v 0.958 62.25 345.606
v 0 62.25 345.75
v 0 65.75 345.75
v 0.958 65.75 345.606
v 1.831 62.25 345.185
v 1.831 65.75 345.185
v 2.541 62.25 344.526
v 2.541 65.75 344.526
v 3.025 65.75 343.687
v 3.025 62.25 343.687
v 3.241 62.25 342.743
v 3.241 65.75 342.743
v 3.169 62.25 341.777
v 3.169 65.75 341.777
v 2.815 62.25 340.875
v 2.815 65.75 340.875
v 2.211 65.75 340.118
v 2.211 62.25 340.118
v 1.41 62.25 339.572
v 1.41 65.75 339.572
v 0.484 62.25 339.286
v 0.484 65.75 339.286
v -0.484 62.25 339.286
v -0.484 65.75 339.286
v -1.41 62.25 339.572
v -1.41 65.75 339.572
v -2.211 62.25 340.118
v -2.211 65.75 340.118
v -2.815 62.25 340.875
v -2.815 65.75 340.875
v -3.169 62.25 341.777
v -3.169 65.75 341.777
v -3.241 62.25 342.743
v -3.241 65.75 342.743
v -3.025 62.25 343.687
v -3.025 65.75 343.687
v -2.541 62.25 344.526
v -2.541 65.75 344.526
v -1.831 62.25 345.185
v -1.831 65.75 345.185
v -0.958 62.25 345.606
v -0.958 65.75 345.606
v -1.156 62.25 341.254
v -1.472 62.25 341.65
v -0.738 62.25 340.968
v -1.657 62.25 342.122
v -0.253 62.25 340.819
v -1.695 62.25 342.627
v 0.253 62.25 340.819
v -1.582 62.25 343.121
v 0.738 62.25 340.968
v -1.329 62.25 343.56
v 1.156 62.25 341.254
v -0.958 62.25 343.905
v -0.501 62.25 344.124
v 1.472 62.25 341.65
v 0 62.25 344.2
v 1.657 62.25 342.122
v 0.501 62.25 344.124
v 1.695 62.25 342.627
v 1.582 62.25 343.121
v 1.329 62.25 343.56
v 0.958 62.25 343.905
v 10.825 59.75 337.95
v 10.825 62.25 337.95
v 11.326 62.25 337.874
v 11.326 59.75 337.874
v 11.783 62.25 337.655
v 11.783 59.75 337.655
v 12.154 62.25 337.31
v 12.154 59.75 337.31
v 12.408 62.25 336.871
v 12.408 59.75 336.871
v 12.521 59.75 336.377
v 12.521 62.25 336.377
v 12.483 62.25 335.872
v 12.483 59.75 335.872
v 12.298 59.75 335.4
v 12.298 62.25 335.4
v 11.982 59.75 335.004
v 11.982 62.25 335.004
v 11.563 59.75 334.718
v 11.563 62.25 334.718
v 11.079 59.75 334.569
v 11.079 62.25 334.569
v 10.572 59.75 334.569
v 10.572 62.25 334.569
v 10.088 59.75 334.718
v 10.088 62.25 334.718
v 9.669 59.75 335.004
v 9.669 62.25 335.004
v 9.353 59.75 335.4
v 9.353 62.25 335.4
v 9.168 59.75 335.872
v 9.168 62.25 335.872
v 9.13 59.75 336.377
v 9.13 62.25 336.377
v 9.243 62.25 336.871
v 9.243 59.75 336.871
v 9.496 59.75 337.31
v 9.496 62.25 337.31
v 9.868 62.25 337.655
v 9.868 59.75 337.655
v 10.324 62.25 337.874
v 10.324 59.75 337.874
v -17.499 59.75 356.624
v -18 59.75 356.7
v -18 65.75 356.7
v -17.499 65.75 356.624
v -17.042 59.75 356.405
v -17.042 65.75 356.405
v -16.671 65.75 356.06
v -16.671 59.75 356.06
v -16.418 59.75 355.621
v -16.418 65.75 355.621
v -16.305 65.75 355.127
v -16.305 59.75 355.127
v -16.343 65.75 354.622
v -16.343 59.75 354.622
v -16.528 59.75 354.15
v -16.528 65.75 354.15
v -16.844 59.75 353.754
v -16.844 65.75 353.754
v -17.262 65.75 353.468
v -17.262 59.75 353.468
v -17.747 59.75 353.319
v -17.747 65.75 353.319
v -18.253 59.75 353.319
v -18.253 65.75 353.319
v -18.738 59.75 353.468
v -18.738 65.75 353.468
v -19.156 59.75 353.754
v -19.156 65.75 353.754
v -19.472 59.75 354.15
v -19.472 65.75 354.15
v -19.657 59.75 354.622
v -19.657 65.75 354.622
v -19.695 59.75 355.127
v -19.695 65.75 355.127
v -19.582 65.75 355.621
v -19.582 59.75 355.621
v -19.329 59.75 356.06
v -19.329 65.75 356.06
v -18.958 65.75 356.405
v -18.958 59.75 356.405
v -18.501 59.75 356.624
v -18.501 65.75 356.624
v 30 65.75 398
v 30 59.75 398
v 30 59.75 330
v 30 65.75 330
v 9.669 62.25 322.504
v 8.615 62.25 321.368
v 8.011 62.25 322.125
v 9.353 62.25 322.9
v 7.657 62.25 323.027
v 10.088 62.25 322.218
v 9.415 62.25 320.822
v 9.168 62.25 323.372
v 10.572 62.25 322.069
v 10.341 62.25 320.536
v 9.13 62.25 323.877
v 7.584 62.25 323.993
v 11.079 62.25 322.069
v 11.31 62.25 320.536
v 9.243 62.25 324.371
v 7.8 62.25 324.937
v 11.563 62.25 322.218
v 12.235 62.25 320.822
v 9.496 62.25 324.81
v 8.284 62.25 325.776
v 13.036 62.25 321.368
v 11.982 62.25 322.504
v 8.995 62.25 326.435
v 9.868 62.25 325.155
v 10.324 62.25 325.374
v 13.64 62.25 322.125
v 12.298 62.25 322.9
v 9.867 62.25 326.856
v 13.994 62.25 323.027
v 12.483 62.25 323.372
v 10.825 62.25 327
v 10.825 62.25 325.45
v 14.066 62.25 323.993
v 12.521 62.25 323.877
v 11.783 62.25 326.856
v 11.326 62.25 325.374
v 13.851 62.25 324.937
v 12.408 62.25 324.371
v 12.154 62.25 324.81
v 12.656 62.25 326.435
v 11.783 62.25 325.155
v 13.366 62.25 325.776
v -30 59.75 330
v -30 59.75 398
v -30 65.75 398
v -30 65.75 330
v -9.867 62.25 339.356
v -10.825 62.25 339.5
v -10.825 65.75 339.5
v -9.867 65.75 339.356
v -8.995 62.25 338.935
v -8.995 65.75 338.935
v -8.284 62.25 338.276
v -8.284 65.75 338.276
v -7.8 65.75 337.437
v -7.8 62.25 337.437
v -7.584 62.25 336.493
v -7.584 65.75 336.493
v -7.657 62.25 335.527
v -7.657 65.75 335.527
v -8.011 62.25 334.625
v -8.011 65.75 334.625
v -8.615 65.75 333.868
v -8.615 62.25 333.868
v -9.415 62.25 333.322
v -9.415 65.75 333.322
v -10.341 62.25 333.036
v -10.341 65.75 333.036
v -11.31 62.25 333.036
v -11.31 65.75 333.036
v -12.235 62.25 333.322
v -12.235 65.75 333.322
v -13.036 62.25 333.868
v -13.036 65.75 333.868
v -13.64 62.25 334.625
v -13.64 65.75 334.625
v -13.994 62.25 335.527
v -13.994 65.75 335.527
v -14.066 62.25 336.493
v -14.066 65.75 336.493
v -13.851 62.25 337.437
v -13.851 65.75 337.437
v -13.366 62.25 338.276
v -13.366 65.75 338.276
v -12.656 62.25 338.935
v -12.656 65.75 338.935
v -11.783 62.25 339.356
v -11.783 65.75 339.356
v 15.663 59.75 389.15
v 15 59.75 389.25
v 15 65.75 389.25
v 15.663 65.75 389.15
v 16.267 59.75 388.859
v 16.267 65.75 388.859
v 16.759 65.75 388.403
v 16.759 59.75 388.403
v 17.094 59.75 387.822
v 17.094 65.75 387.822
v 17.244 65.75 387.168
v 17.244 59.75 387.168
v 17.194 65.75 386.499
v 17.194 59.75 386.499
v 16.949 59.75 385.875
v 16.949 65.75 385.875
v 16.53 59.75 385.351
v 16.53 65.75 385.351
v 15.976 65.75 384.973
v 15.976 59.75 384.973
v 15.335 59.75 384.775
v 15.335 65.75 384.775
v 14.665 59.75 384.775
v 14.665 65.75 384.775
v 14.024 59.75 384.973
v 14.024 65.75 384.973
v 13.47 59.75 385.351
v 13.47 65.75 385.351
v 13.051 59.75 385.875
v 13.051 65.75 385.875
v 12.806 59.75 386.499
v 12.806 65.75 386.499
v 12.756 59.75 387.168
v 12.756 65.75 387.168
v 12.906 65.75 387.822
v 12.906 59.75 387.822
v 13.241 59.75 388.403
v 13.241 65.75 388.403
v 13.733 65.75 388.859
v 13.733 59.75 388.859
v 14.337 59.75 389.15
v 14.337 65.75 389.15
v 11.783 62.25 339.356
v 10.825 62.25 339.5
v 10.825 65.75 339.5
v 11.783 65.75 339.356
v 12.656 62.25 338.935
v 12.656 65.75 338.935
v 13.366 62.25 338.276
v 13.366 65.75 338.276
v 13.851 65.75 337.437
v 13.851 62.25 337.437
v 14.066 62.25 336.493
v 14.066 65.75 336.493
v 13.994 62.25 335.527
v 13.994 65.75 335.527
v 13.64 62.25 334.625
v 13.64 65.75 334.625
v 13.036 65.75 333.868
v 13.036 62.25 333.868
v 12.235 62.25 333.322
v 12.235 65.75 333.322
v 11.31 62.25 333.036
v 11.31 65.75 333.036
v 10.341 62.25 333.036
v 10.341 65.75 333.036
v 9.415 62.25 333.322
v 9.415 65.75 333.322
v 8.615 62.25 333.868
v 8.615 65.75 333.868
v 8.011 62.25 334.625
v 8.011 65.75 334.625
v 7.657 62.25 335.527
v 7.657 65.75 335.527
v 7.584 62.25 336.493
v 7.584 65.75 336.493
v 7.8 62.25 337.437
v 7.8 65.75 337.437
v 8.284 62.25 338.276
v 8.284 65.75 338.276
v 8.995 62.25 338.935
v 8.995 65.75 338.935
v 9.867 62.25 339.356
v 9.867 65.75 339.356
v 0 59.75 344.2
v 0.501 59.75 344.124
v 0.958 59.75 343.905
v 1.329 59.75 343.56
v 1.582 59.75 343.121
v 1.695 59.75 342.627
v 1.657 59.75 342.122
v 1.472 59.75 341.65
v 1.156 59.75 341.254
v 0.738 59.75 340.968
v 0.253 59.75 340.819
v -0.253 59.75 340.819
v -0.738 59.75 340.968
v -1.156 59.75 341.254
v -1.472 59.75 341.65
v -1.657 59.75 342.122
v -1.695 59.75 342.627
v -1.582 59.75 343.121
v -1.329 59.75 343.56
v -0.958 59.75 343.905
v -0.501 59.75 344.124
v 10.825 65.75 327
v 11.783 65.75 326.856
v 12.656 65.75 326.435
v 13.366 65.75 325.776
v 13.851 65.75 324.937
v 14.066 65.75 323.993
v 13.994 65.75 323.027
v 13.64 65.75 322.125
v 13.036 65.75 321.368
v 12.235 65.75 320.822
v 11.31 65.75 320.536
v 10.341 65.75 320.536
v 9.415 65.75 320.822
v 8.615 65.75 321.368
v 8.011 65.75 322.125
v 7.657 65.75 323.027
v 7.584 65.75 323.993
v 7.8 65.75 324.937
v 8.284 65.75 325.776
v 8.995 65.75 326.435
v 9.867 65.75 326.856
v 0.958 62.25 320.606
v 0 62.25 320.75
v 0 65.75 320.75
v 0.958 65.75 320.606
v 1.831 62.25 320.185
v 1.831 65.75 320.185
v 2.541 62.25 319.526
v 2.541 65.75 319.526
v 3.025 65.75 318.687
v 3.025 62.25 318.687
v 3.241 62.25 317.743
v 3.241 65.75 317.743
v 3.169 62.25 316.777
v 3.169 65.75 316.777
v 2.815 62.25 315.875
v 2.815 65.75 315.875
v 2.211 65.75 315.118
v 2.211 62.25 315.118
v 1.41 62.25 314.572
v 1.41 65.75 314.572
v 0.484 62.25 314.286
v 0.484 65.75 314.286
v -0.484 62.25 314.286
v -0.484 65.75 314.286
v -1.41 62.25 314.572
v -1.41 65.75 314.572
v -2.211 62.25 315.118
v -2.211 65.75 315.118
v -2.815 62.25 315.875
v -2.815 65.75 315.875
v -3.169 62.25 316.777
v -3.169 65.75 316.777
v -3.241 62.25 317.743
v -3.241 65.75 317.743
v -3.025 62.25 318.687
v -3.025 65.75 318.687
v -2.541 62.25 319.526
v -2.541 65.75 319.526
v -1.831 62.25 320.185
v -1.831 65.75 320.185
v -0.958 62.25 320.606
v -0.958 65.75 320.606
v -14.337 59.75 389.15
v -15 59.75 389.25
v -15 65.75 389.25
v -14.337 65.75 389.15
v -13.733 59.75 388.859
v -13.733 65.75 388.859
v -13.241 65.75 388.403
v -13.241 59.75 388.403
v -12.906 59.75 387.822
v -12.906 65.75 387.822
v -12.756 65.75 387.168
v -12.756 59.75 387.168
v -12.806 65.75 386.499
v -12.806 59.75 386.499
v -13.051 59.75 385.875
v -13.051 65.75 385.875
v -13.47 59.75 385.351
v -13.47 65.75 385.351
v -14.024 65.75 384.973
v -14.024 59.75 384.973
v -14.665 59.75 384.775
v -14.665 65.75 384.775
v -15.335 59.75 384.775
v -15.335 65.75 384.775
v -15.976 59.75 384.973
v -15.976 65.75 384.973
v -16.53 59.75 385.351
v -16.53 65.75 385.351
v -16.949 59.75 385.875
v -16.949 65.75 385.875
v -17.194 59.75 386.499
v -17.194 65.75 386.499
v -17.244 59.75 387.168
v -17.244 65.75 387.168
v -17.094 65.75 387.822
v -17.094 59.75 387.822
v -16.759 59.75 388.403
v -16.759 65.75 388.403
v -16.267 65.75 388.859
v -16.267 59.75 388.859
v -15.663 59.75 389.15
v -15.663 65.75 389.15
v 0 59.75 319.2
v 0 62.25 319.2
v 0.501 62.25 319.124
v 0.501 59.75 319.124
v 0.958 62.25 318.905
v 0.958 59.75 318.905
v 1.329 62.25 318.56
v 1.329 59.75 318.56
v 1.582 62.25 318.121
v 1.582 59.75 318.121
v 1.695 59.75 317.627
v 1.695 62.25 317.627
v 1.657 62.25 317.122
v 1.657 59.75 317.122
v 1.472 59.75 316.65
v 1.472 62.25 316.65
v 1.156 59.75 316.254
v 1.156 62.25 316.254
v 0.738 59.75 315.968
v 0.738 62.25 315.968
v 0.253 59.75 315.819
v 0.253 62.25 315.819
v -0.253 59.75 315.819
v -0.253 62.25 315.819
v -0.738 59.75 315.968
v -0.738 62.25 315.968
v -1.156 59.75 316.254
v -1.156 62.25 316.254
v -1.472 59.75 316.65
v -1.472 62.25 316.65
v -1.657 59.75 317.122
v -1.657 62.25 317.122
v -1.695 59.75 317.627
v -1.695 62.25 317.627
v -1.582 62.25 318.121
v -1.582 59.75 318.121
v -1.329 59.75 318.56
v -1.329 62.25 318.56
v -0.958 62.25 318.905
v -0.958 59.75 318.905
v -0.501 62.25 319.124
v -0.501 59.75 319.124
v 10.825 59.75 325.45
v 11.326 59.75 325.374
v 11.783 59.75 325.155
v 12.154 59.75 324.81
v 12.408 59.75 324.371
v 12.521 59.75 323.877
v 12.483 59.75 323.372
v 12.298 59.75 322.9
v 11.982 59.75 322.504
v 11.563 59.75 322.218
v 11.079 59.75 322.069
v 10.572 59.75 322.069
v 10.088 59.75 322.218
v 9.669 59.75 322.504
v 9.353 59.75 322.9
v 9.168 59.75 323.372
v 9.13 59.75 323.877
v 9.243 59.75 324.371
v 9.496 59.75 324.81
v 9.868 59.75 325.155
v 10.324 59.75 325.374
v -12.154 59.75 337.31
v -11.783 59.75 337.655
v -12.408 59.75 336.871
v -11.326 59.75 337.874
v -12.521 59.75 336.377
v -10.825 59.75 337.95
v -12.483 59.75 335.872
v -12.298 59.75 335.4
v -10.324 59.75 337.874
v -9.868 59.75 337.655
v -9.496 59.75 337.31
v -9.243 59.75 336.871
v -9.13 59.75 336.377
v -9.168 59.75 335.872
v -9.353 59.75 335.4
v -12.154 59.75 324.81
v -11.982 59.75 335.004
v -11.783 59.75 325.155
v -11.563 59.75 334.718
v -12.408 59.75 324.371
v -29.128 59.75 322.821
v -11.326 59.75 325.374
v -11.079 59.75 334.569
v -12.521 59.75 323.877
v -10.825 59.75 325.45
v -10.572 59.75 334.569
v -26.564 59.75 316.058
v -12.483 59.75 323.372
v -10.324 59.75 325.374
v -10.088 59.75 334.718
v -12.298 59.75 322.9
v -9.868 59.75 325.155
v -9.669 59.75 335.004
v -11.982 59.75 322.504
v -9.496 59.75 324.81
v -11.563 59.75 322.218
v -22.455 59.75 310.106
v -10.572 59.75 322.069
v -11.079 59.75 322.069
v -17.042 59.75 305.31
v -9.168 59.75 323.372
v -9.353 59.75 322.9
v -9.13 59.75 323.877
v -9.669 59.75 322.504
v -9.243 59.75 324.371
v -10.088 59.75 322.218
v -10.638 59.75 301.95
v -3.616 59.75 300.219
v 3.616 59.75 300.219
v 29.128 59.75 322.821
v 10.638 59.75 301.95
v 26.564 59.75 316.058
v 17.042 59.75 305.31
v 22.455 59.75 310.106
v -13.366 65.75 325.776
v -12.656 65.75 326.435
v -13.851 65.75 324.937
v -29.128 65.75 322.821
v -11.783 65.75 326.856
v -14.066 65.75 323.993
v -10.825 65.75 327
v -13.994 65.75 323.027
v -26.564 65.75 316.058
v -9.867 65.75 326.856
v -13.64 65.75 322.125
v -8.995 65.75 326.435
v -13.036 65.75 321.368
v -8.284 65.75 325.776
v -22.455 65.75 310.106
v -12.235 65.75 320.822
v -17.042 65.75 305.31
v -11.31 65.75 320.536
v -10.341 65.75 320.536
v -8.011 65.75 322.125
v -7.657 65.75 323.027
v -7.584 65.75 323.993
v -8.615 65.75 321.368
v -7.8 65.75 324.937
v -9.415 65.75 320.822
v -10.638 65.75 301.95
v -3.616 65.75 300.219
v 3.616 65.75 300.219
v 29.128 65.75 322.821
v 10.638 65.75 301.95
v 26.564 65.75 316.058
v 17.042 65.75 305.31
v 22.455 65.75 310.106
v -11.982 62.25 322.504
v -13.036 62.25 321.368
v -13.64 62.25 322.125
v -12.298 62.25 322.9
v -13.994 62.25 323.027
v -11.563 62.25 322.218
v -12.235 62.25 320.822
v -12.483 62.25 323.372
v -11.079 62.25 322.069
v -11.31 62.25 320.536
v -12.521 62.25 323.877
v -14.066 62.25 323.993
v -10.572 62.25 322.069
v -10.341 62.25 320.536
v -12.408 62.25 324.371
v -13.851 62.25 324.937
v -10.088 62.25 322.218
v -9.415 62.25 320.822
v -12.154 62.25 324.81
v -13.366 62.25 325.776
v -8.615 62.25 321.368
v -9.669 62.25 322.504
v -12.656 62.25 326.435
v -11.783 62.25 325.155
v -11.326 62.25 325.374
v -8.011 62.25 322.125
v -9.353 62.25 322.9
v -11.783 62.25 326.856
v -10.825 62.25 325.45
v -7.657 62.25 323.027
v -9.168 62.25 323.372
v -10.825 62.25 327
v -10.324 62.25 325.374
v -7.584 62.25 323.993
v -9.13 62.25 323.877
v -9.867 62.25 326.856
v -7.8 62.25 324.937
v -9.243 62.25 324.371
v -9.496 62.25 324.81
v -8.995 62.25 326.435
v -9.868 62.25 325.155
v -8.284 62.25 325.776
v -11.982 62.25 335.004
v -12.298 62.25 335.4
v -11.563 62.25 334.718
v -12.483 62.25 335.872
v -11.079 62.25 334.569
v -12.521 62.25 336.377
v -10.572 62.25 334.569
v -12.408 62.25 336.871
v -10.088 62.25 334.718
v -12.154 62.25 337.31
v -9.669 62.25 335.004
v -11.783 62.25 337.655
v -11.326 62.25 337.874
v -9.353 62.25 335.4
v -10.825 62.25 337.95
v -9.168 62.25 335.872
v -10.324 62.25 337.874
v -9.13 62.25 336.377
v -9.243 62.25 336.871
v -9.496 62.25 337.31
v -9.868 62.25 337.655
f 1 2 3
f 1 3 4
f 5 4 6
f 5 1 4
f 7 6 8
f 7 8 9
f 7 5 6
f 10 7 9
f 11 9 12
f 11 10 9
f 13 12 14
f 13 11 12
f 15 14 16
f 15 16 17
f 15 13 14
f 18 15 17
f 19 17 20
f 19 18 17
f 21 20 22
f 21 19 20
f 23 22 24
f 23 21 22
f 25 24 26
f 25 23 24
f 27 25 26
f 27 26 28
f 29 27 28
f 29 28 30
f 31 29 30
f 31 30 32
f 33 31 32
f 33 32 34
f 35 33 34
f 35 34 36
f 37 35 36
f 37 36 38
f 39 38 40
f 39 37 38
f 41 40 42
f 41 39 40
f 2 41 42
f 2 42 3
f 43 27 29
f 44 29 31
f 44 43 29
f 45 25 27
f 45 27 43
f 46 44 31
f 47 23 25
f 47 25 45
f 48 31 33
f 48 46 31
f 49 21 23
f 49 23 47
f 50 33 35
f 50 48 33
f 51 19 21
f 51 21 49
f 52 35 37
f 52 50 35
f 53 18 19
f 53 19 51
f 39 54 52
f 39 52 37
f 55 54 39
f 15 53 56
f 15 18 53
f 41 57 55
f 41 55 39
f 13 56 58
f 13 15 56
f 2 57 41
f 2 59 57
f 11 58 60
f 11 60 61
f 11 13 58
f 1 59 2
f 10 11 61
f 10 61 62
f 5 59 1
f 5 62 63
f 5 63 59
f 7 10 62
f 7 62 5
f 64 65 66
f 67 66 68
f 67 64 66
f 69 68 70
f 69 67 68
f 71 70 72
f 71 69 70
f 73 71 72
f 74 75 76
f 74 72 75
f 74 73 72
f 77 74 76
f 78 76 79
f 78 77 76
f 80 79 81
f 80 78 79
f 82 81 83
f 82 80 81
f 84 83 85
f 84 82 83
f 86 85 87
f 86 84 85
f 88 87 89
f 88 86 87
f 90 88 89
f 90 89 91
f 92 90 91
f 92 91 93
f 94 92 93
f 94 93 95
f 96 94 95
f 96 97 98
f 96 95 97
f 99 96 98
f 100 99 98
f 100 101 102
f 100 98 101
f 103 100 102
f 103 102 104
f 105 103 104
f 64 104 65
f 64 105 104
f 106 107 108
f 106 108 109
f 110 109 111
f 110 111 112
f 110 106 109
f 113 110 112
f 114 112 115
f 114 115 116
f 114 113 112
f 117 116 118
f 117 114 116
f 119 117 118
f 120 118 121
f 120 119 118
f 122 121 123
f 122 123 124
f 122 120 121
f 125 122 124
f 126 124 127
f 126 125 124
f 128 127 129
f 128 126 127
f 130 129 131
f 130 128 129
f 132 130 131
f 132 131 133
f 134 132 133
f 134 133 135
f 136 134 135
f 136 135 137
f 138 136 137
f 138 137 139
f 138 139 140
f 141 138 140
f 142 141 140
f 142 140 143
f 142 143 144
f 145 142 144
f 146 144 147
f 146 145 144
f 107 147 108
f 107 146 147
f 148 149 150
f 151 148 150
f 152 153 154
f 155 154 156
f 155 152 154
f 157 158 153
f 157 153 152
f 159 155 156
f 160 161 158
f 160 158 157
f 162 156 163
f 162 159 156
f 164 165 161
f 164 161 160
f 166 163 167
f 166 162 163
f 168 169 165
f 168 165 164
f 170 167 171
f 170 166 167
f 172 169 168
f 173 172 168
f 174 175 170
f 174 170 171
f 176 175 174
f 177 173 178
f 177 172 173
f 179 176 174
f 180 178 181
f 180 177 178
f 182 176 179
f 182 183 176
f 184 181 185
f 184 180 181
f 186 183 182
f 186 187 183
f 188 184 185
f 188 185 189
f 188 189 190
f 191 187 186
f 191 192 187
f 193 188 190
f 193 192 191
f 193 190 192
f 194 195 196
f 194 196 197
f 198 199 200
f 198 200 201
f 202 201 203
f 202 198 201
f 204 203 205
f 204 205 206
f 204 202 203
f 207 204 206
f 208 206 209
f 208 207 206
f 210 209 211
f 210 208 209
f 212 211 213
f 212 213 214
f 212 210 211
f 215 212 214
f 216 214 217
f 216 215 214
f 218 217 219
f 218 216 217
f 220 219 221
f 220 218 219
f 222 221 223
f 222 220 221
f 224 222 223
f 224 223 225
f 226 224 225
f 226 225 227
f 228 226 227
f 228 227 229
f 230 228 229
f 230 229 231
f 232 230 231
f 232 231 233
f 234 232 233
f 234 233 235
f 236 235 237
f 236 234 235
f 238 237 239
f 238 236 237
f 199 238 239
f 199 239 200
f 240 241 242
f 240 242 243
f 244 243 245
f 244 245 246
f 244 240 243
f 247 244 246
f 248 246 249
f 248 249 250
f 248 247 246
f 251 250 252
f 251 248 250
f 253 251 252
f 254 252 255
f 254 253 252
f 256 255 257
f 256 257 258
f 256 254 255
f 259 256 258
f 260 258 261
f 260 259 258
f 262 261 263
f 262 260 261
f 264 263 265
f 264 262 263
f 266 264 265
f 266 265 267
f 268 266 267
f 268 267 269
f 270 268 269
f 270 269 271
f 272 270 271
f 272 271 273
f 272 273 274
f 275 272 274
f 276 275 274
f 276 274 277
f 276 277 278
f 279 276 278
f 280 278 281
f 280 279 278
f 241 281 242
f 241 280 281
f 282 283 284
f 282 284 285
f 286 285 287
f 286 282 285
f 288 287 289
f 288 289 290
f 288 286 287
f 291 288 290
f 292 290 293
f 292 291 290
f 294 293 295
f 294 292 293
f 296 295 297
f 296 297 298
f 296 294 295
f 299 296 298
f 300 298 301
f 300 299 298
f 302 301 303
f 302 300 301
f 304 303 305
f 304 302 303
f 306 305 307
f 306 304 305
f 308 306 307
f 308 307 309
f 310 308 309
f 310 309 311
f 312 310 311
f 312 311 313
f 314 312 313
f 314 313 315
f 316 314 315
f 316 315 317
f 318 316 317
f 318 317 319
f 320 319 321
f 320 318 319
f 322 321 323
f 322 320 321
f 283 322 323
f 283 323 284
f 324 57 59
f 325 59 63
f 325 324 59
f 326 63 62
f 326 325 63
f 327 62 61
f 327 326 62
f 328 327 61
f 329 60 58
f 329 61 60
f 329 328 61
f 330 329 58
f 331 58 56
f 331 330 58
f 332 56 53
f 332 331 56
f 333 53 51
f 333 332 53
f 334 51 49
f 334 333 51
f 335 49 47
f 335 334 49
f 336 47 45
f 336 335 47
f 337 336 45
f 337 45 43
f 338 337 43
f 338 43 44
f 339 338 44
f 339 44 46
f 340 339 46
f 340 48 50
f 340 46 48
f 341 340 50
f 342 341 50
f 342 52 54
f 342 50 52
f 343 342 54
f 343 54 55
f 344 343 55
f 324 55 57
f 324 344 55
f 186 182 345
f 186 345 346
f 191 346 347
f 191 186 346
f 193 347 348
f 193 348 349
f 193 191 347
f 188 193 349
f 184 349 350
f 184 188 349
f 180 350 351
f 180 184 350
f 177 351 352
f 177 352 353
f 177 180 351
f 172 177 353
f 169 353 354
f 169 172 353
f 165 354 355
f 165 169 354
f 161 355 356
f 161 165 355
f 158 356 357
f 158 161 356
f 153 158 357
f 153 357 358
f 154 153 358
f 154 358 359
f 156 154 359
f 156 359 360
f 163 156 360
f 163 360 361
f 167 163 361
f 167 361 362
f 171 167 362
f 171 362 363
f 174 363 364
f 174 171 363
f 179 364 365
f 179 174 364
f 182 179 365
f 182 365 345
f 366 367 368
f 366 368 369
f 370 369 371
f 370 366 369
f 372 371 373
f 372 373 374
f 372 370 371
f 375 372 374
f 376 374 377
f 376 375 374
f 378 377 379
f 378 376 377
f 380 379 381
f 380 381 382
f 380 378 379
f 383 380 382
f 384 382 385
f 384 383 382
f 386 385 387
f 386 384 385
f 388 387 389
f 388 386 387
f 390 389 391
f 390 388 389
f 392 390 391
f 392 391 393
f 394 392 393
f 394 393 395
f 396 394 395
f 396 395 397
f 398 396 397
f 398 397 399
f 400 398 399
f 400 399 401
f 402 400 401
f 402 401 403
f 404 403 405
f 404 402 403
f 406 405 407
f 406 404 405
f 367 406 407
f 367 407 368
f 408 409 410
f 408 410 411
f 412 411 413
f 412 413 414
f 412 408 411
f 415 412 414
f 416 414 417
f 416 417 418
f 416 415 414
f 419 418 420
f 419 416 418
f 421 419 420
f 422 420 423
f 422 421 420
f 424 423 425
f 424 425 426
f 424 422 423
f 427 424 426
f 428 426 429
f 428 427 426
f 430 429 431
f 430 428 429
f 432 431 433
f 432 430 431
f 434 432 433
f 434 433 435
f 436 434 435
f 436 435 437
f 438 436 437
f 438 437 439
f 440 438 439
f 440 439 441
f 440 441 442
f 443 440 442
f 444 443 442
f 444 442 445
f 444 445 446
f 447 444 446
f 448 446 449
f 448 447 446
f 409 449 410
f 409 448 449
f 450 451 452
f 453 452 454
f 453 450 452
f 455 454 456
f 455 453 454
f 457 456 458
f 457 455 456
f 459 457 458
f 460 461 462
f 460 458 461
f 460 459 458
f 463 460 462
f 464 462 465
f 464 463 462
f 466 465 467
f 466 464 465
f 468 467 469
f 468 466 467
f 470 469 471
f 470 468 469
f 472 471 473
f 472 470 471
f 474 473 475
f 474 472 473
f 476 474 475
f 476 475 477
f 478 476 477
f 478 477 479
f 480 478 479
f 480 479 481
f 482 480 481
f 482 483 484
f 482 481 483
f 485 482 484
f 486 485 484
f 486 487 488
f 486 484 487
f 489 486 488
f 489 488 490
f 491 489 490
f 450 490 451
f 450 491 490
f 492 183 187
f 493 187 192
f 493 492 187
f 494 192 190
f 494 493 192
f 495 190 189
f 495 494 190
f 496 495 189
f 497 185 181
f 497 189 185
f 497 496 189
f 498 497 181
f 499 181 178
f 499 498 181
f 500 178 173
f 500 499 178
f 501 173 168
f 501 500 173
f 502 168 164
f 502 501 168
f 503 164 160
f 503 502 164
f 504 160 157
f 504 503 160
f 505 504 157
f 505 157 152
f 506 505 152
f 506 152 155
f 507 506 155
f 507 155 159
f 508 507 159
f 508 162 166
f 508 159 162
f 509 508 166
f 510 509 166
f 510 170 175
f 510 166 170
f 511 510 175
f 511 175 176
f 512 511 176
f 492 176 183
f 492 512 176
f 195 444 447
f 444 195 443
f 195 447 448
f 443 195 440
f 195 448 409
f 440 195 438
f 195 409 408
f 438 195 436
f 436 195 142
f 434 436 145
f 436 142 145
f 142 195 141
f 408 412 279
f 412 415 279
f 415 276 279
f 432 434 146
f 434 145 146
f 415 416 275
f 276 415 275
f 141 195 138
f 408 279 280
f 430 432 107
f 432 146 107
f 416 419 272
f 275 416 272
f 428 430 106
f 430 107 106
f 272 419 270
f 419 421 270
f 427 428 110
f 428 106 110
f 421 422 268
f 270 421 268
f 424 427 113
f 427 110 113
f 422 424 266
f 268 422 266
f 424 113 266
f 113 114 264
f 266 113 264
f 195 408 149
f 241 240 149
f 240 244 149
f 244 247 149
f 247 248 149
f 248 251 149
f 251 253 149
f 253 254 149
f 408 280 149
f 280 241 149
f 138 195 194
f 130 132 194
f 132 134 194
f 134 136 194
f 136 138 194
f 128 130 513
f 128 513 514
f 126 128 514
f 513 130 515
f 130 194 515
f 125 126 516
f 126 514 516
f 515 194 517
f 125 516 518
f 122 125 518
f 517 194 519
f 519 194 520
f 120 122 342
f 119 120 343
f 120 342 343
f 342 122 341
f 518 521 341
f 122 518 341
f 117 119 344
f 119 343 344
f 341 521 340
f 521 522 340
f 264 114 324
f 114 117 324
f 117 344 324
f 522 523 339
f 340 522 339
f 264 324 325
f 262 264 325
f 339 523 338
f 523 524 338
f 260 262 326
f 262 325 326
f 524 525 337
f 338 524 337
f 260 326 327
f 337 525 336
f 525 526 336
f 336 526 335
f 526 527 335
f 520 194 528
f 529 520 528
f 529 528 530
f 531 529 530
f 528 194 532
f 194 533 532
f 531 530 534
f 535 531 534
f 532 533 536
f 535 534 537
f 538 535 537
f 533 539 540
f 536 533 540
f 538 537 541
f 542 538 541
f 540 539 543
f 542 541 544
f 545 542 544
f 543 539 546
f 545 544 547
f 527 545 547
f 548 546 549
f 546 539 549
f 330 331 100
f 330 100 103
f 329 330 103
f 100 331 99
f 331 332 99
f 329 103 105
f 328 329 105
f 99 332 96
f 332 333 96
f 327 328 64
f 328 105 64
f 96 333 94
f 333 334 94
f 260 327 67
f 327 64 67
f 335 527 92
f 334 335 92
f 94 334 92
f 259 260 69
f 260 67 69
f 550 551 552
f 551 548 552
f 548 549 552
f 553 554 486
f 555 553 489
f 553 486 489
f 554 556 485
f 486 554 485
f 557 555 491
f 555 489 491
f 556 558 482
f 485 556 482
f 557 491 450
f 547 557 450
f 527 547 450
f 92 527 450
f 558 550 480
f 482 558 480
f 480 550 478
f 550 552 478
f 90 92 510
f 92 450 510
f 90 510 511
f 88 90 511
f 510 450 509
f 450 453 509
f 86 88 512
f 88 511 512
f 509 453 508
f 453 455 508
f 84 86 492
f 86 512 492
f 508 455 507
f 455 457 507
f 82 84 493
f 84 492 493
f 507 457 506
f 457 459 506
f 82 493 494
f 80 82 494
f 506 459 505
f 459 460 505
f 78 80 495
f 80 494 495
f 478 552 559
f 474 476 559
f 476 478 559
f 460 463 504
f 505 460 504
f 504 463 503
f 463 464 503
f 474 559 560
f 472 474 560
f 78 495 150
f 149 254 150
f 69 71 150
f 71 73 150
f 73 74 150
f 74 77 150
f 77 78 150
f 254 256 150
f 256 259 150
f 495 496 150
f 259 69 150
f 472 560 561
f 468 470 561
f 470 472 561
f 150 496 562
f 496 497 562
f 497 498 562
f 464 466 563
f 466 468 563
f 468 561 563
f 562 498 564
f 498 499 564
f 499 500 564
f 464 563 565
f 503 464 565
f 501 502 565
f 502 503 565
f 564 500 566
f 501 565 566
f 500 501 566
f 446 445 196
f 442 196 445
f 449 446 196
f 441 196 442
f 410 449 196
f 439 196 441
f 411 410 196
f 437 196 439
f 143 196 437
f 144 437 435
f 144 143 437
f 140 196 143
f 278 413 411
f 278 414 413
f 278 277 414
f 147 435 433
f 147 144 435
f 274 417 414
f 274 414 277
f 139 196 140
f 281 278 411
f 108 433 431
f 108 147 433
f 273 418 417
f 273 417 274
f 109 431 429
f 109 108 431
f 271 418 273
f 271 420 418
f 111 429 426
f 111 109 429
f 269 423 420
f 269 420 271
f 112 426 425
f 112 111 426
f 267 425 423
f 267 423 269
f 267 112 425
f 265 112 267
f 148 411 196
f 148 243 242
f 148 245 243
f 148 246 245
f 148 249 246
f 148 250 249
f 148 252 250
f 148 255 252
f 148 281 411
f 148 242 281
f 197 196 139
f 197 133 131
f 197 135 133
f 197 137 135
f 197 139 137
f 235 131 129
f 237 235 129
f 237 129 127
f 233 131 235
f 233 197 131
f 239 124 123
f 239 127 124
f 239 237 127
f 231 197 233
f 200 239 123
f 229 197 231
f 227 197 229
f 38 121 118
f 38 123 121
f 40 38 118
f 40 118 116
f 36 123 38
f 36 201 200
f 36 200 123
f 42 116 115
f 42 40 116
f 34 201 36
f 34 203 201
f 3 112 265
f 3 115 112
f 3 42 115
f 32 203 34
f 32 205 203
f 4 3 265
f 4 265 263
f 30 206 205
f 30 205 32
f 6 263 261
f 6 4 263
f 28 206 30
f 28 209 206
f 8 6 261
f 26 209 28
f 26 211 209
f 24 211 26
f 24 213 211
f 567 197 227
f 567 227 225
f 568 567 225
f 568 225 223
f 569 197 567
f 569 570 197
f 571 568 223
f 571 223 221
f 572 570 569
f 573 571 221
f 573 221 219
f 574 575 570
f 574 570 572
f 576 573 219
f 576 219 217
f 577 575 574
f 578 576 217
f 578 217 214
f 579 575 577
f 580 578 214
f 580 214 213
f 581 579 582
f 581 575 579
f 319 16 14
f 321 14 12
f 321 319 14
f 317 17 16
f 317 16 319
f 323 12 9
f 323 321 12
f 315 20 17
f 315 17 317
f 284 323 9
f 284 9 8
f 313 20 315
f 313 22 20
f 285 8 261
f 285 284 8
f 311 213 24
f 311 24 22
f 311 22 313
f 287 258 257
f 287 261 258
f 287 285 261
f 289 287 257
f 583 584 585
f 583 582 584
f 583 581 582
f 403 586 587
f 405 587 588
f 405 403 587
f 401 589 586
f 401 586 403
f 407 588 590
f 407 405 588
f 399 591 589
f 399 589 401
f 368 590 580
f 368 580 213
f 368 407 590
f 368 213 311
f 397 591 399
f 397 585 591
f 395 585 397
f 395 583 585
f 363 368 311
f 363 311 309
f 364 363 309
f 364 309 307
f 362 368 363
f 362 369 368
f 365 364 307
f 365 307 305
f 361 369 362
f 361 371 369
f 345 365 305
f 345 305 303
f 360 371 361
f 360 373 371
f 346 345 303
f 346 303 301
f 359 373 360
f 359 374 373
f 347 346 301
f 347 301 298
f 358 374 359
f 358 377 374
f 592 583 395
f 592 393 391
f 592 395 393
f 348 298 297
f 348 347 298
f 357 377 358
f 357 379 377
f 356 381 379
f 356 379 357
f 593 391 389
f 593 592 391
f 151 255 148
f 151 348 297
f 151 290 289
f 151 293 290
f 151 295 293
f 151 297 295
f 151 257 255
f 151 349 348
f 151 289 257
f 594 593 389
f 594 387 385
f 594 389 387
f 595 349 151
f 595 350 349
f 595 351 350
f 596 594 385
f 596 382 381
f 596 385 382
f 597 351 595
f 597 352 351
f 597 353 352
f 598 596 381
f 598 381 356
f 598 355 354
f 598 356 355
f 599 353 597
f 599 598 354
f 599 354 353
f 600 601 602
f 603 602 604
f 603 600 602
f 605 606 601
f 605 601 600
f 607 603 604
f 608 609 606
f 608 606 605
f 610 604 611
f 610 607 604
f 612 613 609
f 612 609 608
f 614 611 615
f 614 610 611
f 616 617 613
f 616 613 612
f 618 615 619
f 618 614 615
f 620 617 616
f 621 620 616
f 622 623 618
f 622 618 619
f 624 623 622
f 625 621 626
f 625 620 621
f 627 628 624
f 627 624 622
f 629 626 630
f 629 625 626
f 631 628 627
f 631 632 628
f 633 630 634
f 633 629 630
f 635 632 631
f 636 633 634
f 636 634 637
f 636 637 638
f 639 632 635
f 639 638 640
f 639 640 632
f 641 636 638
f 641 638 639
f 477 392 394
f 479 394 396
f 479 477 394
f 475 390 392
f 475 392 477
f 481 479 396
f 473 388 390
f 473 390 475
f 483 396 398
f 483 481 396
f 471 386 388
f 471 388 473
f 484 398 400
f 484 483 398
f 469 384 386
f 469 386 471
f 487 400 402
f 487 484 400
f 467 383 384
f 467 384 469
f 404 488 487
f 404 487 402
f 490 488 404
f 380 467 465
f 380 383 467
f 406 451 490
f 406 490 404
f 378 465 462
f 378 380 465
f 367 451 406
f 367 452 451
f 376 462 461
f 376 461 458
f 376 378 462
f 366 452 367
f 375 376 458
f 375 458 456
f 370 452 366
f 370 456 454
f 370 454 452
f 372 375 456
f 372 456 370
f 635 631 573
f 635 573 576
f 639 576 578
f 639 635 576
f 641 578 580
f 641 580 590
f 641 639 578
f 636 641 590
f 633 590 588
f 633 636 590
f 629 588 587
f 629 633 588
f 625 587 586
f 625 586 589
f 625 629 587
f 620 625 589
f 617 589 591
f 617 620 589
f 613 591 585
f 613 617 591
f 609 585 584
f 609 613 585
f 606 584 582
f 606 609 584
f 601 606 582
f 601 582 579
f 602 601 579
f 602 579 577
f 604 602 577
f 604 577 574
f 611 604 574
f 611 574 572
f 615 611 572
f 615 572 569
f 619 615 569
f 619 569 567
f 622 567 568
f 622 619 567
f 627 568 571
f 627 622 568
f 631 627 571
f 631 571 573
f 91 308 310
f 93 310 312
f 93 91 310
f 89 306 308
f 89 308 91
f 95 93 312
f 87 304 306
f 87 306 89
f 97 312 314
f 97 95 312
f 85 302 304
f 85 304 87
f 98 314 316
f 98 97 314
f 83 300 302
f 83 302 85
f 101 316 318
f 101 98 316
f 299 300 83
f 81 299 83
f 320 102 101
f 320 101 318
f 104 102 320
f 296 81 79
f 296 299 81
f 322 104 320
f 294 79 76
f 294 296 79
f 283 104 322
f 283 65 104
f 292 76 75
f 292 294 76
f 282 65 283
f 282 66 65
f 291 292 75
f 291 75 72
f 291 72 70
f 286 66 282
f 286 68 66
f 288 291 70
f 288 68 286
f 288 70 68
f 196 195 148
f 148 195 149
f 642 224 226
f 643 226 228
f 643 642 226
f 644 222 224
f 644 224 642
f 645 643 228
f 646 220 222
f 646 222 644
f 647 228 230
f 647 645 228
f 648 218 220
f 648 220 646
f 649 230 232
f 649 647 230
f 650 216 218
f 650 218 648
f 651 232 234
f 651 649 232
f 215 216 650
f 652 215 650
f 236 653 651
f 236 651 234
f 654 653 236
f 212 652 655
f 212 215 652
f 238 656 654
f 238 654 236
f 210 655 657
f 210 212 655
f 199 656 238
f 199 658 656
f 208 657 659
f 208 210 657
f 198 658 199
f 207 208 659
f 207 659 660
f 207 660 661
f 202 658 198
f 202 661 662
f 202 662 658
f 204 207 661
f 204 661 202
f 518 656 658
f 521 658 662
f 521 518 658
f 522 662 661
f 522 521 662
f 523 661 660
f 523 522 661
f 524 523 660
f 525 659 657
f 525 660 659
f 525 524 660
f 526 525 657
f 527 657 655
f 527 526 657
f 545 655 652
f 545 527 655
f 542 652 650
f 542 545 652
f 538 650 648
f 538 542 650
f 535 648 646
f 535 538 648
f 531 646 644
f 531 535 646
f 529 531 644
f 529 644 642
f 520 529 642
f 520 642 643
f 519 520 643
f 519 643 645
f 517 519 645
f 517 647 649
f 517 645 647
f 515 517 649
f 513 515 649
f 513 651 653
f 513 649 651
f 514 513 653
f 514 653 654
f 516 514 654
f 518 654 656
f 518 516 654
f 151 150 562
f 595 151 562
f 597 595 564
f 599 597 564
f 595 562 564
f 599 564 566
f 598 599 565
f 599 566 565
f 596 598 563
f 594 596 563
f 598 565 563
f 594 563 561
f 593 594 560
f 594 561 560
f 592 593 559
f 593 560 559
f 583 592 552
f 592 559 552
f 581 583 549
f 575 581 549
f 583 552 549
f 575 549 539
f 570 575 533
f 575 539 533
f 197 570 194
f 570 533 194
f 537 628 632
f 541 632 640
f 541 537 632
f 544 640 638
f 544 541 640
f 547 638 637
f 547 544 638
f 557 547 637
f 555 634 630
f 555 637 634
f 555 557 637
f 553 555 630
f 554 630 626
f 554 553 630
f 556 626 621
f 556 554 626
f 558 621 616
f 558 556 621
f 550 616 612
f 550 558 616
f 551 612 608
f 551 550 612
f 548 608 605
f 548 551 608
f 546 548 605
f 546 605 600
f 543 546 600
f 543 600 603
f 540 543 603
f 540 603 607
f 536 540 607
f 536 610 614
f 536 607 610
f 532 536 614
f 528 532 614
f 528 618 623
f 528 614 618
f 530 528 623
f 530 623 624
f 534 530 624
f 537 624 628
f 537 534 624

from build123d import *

# Parameters (mm, degrees)
PLACA_START               = 59.75
SK_PLACA_W                = 60
SK_PLACA_H                = 49
PLACA_DEPTH               = 6
EXTREMO_START             = 59.75
SK_EXTREMO_R              = 30
EXTREMO_DEPTH             = 6
PASANTES_M3_CUBO_J3_START = 59.75
SK_PASANTES_M3_CUBO_J3_R  = 1.7
PASANTES_M3_CUBO_J3_DEPTH = 6
CAJAS_M3_J3_START         = 62.25
SK_CAJAS_M3_J3_R          = 3.25
CAJAS_M3_J3_DEPTH         = 3.5
EXTENSION_PESTANAS_START  = 59.75
SK_EXTENSION_PESTANAS_W   = 60
SK_EXTENSION_PESTANAS_H   = 19
EXTENSION_PESTANAS_DEPTH  = 6
PASANTES_M4_REPISA_START  = 59.75
SK_PASANTES_M4_REPISA_R   = 2.25
PASANTES_M4_REPISA_DEPTH  = 6
PASANTE_M3_CINCHO_START   = 59.75
SK_PASANTE_M3_CINCHO_R    = 1.7
PASANTE_M3_CINCHO_DEPTH   = 6


with BuildPart() as part:
    # Sk_Placa → Placa (new body)
    with BuildSketch(Plane(origin=(0, 0, 0), x_dir=(1, 0, 0), z_dir=(0, 1, 0)).offset(PLACA_START)):
        with Locations((0, -354.5)):
            Rectangle(SK_PLACA_W, SK_PLACA_H)
    extrude(amount=PLACA_DEPTH)

    # Sk_Extremo → Extremo (add)
    with BuildSketch(Plane(origin=(0, 0, 0), x_dir=(1, 0, 0), z_dir=(0, 1, 0)).offset(EXTREMO_START)):
        with Locations((0, -330)):
            Circle(SK_EXTREMO_R)
    extrude(amount=EXTREMO_DEPTH)

    # Sk_Pasantes_M3_cubo_J3 → Pasantes_M3_cubo_J3 (cut)
    with BuildSketch(Plane(origin=(0, 0, 0), x_dir=(1, 0, 0), z_dir=(0, 1, 0)).offset(PASANTES_M3_CUBO_J3_START)):
        with Locations(Location((10.825317547, -336.25, 0), (0, 0, 270))):
            Circle(SK_PASANTES_M3_CUBO_J3_R)
        with Locations(Location((0, -342.5, 0), (0, 0, 270))):
            Circle(SK_PASANTES_M3_CUBO_J3_R)
        with Locations(Location((-10.825317547, -336.25, 0), (0, 0, 270))):
            Circle(SK_PASANTES_M3_CUBO_J3_R)
        with Locations(Location((-10.825317547, -323.75, 0), (0, 0, 270))):
            Circle(SK_PASANTES_M3_CUBO_J3_R)
        with Locations(Location((0, -317.5, 0), (0, 0, 270))):
            Circle(SK_PASANTES_M3_CUBO_J3_R)
        with Locations(Location((10.825317547, -323.75, 0), (0, 0, 270))):
            Circle(SK_PASANTES_M3_CUBO_J3_R)
    extrude(amount=PASANTES_M3_CUBO_J3_DEPTH, mode=Mode.SUBTRACT)

    # Sk_Cajas_M3_J3 → Cajas_M3_J3 (cut)
    with BuildSketch(Plane(origin=(0, 0, 0), x_dir=(1, 0, 0), z_dir=(0, 1, 0)).offset(CAJAS_M3_J3_START)):
        with Locations(Location((10.825317547, -336.25, 0), (0, 0, 270))):
            Circle(SK_CAJAS_M3_J3_R)
        with Locations(Location((0, -342.5, 0), (0, 0, 270))):
            Circle(SK_CAJAS_M3_J3_R)
        with Locations(Location((-10.825317547, -336.25, 0), (0, 0, 270))):
            Circle(SK_CAJAS_M3_J3_R)
        with Locations(Location((-10.825317547, -323.75, 0), (0, 0, 270))):
            Circle(SK_CAJAS_M3_J3_R)
        with Locations(Location((0, -317.5, 0), (0, 0, 270))):
            Circle(SK_CAJAS_M3_J3_R)
        with Locations(Location((10.825317547, -323.75, 0), (0, 0, 270))):
            Circle(SK_CAJAS_M3_J3_R)
    extrude(amount=CAJAS_M3_J3_DEPTH, mode=Mode.SUBTRACT)

    # Sk_Extension_pestanas → Extension_pestanas (add)
    with BuildSketch(Plane(origin=(0, 0, 0), x_dir=(1, 0, 0), z_dir=(0, 1, 0)).offset(EXTENSION_PESTANAS_START)):
        with Locations((0, -388.5)):
            Rectangle(SK_EXTENSION_PESTANAS_W, SK_EXTENSION_PESTANAS_H)
    extrude(amount=EXTENSION_PESTANAS_DEPTH)

    # Sk_Pasantes_M4_repisa → Pasantes_M4_repisa (cut)
    with BuildSketch(Plane(origin=(0, 0, 0), x_dir=(1, 0, 0), z_dir=(0, 1, 0)).offset(PASANTES_M4_REPISA_START)):
        with Locations(Location((-15, -387, 0), (0, 0, 270))):
            Circle(SK_PASANTES_M4_REPISA_R)
        with Locations(Location((15, -387, 0), (0, 0, 270))):
            Circle(SK_PASANTES_M4_REPISA_R)
    extrude(amount=PASANTES_M4_REPISA_DEPTH, mode=Mode.SUBTRACT)

    # Sk_Pasante_M3_cincho → Pasante_M3_cincho (cut)
    with BuildSketch(Plane(origin=(0, 0, 0), x_dir=(1, 0, 0), z_dir=(0, 1, 0)).offset(PASANTE_M3_CINCHO_START)):
        with Locations(Location((-18, -355, 0), (0, 0, 270))):
            Circle(SK_PASANTE_M3_CINCHO_R)
    extrude(amount=PASANTE_M3_CINCHO_DEPTH, mode=Mode.SUBTRACT)


solid = part.part
